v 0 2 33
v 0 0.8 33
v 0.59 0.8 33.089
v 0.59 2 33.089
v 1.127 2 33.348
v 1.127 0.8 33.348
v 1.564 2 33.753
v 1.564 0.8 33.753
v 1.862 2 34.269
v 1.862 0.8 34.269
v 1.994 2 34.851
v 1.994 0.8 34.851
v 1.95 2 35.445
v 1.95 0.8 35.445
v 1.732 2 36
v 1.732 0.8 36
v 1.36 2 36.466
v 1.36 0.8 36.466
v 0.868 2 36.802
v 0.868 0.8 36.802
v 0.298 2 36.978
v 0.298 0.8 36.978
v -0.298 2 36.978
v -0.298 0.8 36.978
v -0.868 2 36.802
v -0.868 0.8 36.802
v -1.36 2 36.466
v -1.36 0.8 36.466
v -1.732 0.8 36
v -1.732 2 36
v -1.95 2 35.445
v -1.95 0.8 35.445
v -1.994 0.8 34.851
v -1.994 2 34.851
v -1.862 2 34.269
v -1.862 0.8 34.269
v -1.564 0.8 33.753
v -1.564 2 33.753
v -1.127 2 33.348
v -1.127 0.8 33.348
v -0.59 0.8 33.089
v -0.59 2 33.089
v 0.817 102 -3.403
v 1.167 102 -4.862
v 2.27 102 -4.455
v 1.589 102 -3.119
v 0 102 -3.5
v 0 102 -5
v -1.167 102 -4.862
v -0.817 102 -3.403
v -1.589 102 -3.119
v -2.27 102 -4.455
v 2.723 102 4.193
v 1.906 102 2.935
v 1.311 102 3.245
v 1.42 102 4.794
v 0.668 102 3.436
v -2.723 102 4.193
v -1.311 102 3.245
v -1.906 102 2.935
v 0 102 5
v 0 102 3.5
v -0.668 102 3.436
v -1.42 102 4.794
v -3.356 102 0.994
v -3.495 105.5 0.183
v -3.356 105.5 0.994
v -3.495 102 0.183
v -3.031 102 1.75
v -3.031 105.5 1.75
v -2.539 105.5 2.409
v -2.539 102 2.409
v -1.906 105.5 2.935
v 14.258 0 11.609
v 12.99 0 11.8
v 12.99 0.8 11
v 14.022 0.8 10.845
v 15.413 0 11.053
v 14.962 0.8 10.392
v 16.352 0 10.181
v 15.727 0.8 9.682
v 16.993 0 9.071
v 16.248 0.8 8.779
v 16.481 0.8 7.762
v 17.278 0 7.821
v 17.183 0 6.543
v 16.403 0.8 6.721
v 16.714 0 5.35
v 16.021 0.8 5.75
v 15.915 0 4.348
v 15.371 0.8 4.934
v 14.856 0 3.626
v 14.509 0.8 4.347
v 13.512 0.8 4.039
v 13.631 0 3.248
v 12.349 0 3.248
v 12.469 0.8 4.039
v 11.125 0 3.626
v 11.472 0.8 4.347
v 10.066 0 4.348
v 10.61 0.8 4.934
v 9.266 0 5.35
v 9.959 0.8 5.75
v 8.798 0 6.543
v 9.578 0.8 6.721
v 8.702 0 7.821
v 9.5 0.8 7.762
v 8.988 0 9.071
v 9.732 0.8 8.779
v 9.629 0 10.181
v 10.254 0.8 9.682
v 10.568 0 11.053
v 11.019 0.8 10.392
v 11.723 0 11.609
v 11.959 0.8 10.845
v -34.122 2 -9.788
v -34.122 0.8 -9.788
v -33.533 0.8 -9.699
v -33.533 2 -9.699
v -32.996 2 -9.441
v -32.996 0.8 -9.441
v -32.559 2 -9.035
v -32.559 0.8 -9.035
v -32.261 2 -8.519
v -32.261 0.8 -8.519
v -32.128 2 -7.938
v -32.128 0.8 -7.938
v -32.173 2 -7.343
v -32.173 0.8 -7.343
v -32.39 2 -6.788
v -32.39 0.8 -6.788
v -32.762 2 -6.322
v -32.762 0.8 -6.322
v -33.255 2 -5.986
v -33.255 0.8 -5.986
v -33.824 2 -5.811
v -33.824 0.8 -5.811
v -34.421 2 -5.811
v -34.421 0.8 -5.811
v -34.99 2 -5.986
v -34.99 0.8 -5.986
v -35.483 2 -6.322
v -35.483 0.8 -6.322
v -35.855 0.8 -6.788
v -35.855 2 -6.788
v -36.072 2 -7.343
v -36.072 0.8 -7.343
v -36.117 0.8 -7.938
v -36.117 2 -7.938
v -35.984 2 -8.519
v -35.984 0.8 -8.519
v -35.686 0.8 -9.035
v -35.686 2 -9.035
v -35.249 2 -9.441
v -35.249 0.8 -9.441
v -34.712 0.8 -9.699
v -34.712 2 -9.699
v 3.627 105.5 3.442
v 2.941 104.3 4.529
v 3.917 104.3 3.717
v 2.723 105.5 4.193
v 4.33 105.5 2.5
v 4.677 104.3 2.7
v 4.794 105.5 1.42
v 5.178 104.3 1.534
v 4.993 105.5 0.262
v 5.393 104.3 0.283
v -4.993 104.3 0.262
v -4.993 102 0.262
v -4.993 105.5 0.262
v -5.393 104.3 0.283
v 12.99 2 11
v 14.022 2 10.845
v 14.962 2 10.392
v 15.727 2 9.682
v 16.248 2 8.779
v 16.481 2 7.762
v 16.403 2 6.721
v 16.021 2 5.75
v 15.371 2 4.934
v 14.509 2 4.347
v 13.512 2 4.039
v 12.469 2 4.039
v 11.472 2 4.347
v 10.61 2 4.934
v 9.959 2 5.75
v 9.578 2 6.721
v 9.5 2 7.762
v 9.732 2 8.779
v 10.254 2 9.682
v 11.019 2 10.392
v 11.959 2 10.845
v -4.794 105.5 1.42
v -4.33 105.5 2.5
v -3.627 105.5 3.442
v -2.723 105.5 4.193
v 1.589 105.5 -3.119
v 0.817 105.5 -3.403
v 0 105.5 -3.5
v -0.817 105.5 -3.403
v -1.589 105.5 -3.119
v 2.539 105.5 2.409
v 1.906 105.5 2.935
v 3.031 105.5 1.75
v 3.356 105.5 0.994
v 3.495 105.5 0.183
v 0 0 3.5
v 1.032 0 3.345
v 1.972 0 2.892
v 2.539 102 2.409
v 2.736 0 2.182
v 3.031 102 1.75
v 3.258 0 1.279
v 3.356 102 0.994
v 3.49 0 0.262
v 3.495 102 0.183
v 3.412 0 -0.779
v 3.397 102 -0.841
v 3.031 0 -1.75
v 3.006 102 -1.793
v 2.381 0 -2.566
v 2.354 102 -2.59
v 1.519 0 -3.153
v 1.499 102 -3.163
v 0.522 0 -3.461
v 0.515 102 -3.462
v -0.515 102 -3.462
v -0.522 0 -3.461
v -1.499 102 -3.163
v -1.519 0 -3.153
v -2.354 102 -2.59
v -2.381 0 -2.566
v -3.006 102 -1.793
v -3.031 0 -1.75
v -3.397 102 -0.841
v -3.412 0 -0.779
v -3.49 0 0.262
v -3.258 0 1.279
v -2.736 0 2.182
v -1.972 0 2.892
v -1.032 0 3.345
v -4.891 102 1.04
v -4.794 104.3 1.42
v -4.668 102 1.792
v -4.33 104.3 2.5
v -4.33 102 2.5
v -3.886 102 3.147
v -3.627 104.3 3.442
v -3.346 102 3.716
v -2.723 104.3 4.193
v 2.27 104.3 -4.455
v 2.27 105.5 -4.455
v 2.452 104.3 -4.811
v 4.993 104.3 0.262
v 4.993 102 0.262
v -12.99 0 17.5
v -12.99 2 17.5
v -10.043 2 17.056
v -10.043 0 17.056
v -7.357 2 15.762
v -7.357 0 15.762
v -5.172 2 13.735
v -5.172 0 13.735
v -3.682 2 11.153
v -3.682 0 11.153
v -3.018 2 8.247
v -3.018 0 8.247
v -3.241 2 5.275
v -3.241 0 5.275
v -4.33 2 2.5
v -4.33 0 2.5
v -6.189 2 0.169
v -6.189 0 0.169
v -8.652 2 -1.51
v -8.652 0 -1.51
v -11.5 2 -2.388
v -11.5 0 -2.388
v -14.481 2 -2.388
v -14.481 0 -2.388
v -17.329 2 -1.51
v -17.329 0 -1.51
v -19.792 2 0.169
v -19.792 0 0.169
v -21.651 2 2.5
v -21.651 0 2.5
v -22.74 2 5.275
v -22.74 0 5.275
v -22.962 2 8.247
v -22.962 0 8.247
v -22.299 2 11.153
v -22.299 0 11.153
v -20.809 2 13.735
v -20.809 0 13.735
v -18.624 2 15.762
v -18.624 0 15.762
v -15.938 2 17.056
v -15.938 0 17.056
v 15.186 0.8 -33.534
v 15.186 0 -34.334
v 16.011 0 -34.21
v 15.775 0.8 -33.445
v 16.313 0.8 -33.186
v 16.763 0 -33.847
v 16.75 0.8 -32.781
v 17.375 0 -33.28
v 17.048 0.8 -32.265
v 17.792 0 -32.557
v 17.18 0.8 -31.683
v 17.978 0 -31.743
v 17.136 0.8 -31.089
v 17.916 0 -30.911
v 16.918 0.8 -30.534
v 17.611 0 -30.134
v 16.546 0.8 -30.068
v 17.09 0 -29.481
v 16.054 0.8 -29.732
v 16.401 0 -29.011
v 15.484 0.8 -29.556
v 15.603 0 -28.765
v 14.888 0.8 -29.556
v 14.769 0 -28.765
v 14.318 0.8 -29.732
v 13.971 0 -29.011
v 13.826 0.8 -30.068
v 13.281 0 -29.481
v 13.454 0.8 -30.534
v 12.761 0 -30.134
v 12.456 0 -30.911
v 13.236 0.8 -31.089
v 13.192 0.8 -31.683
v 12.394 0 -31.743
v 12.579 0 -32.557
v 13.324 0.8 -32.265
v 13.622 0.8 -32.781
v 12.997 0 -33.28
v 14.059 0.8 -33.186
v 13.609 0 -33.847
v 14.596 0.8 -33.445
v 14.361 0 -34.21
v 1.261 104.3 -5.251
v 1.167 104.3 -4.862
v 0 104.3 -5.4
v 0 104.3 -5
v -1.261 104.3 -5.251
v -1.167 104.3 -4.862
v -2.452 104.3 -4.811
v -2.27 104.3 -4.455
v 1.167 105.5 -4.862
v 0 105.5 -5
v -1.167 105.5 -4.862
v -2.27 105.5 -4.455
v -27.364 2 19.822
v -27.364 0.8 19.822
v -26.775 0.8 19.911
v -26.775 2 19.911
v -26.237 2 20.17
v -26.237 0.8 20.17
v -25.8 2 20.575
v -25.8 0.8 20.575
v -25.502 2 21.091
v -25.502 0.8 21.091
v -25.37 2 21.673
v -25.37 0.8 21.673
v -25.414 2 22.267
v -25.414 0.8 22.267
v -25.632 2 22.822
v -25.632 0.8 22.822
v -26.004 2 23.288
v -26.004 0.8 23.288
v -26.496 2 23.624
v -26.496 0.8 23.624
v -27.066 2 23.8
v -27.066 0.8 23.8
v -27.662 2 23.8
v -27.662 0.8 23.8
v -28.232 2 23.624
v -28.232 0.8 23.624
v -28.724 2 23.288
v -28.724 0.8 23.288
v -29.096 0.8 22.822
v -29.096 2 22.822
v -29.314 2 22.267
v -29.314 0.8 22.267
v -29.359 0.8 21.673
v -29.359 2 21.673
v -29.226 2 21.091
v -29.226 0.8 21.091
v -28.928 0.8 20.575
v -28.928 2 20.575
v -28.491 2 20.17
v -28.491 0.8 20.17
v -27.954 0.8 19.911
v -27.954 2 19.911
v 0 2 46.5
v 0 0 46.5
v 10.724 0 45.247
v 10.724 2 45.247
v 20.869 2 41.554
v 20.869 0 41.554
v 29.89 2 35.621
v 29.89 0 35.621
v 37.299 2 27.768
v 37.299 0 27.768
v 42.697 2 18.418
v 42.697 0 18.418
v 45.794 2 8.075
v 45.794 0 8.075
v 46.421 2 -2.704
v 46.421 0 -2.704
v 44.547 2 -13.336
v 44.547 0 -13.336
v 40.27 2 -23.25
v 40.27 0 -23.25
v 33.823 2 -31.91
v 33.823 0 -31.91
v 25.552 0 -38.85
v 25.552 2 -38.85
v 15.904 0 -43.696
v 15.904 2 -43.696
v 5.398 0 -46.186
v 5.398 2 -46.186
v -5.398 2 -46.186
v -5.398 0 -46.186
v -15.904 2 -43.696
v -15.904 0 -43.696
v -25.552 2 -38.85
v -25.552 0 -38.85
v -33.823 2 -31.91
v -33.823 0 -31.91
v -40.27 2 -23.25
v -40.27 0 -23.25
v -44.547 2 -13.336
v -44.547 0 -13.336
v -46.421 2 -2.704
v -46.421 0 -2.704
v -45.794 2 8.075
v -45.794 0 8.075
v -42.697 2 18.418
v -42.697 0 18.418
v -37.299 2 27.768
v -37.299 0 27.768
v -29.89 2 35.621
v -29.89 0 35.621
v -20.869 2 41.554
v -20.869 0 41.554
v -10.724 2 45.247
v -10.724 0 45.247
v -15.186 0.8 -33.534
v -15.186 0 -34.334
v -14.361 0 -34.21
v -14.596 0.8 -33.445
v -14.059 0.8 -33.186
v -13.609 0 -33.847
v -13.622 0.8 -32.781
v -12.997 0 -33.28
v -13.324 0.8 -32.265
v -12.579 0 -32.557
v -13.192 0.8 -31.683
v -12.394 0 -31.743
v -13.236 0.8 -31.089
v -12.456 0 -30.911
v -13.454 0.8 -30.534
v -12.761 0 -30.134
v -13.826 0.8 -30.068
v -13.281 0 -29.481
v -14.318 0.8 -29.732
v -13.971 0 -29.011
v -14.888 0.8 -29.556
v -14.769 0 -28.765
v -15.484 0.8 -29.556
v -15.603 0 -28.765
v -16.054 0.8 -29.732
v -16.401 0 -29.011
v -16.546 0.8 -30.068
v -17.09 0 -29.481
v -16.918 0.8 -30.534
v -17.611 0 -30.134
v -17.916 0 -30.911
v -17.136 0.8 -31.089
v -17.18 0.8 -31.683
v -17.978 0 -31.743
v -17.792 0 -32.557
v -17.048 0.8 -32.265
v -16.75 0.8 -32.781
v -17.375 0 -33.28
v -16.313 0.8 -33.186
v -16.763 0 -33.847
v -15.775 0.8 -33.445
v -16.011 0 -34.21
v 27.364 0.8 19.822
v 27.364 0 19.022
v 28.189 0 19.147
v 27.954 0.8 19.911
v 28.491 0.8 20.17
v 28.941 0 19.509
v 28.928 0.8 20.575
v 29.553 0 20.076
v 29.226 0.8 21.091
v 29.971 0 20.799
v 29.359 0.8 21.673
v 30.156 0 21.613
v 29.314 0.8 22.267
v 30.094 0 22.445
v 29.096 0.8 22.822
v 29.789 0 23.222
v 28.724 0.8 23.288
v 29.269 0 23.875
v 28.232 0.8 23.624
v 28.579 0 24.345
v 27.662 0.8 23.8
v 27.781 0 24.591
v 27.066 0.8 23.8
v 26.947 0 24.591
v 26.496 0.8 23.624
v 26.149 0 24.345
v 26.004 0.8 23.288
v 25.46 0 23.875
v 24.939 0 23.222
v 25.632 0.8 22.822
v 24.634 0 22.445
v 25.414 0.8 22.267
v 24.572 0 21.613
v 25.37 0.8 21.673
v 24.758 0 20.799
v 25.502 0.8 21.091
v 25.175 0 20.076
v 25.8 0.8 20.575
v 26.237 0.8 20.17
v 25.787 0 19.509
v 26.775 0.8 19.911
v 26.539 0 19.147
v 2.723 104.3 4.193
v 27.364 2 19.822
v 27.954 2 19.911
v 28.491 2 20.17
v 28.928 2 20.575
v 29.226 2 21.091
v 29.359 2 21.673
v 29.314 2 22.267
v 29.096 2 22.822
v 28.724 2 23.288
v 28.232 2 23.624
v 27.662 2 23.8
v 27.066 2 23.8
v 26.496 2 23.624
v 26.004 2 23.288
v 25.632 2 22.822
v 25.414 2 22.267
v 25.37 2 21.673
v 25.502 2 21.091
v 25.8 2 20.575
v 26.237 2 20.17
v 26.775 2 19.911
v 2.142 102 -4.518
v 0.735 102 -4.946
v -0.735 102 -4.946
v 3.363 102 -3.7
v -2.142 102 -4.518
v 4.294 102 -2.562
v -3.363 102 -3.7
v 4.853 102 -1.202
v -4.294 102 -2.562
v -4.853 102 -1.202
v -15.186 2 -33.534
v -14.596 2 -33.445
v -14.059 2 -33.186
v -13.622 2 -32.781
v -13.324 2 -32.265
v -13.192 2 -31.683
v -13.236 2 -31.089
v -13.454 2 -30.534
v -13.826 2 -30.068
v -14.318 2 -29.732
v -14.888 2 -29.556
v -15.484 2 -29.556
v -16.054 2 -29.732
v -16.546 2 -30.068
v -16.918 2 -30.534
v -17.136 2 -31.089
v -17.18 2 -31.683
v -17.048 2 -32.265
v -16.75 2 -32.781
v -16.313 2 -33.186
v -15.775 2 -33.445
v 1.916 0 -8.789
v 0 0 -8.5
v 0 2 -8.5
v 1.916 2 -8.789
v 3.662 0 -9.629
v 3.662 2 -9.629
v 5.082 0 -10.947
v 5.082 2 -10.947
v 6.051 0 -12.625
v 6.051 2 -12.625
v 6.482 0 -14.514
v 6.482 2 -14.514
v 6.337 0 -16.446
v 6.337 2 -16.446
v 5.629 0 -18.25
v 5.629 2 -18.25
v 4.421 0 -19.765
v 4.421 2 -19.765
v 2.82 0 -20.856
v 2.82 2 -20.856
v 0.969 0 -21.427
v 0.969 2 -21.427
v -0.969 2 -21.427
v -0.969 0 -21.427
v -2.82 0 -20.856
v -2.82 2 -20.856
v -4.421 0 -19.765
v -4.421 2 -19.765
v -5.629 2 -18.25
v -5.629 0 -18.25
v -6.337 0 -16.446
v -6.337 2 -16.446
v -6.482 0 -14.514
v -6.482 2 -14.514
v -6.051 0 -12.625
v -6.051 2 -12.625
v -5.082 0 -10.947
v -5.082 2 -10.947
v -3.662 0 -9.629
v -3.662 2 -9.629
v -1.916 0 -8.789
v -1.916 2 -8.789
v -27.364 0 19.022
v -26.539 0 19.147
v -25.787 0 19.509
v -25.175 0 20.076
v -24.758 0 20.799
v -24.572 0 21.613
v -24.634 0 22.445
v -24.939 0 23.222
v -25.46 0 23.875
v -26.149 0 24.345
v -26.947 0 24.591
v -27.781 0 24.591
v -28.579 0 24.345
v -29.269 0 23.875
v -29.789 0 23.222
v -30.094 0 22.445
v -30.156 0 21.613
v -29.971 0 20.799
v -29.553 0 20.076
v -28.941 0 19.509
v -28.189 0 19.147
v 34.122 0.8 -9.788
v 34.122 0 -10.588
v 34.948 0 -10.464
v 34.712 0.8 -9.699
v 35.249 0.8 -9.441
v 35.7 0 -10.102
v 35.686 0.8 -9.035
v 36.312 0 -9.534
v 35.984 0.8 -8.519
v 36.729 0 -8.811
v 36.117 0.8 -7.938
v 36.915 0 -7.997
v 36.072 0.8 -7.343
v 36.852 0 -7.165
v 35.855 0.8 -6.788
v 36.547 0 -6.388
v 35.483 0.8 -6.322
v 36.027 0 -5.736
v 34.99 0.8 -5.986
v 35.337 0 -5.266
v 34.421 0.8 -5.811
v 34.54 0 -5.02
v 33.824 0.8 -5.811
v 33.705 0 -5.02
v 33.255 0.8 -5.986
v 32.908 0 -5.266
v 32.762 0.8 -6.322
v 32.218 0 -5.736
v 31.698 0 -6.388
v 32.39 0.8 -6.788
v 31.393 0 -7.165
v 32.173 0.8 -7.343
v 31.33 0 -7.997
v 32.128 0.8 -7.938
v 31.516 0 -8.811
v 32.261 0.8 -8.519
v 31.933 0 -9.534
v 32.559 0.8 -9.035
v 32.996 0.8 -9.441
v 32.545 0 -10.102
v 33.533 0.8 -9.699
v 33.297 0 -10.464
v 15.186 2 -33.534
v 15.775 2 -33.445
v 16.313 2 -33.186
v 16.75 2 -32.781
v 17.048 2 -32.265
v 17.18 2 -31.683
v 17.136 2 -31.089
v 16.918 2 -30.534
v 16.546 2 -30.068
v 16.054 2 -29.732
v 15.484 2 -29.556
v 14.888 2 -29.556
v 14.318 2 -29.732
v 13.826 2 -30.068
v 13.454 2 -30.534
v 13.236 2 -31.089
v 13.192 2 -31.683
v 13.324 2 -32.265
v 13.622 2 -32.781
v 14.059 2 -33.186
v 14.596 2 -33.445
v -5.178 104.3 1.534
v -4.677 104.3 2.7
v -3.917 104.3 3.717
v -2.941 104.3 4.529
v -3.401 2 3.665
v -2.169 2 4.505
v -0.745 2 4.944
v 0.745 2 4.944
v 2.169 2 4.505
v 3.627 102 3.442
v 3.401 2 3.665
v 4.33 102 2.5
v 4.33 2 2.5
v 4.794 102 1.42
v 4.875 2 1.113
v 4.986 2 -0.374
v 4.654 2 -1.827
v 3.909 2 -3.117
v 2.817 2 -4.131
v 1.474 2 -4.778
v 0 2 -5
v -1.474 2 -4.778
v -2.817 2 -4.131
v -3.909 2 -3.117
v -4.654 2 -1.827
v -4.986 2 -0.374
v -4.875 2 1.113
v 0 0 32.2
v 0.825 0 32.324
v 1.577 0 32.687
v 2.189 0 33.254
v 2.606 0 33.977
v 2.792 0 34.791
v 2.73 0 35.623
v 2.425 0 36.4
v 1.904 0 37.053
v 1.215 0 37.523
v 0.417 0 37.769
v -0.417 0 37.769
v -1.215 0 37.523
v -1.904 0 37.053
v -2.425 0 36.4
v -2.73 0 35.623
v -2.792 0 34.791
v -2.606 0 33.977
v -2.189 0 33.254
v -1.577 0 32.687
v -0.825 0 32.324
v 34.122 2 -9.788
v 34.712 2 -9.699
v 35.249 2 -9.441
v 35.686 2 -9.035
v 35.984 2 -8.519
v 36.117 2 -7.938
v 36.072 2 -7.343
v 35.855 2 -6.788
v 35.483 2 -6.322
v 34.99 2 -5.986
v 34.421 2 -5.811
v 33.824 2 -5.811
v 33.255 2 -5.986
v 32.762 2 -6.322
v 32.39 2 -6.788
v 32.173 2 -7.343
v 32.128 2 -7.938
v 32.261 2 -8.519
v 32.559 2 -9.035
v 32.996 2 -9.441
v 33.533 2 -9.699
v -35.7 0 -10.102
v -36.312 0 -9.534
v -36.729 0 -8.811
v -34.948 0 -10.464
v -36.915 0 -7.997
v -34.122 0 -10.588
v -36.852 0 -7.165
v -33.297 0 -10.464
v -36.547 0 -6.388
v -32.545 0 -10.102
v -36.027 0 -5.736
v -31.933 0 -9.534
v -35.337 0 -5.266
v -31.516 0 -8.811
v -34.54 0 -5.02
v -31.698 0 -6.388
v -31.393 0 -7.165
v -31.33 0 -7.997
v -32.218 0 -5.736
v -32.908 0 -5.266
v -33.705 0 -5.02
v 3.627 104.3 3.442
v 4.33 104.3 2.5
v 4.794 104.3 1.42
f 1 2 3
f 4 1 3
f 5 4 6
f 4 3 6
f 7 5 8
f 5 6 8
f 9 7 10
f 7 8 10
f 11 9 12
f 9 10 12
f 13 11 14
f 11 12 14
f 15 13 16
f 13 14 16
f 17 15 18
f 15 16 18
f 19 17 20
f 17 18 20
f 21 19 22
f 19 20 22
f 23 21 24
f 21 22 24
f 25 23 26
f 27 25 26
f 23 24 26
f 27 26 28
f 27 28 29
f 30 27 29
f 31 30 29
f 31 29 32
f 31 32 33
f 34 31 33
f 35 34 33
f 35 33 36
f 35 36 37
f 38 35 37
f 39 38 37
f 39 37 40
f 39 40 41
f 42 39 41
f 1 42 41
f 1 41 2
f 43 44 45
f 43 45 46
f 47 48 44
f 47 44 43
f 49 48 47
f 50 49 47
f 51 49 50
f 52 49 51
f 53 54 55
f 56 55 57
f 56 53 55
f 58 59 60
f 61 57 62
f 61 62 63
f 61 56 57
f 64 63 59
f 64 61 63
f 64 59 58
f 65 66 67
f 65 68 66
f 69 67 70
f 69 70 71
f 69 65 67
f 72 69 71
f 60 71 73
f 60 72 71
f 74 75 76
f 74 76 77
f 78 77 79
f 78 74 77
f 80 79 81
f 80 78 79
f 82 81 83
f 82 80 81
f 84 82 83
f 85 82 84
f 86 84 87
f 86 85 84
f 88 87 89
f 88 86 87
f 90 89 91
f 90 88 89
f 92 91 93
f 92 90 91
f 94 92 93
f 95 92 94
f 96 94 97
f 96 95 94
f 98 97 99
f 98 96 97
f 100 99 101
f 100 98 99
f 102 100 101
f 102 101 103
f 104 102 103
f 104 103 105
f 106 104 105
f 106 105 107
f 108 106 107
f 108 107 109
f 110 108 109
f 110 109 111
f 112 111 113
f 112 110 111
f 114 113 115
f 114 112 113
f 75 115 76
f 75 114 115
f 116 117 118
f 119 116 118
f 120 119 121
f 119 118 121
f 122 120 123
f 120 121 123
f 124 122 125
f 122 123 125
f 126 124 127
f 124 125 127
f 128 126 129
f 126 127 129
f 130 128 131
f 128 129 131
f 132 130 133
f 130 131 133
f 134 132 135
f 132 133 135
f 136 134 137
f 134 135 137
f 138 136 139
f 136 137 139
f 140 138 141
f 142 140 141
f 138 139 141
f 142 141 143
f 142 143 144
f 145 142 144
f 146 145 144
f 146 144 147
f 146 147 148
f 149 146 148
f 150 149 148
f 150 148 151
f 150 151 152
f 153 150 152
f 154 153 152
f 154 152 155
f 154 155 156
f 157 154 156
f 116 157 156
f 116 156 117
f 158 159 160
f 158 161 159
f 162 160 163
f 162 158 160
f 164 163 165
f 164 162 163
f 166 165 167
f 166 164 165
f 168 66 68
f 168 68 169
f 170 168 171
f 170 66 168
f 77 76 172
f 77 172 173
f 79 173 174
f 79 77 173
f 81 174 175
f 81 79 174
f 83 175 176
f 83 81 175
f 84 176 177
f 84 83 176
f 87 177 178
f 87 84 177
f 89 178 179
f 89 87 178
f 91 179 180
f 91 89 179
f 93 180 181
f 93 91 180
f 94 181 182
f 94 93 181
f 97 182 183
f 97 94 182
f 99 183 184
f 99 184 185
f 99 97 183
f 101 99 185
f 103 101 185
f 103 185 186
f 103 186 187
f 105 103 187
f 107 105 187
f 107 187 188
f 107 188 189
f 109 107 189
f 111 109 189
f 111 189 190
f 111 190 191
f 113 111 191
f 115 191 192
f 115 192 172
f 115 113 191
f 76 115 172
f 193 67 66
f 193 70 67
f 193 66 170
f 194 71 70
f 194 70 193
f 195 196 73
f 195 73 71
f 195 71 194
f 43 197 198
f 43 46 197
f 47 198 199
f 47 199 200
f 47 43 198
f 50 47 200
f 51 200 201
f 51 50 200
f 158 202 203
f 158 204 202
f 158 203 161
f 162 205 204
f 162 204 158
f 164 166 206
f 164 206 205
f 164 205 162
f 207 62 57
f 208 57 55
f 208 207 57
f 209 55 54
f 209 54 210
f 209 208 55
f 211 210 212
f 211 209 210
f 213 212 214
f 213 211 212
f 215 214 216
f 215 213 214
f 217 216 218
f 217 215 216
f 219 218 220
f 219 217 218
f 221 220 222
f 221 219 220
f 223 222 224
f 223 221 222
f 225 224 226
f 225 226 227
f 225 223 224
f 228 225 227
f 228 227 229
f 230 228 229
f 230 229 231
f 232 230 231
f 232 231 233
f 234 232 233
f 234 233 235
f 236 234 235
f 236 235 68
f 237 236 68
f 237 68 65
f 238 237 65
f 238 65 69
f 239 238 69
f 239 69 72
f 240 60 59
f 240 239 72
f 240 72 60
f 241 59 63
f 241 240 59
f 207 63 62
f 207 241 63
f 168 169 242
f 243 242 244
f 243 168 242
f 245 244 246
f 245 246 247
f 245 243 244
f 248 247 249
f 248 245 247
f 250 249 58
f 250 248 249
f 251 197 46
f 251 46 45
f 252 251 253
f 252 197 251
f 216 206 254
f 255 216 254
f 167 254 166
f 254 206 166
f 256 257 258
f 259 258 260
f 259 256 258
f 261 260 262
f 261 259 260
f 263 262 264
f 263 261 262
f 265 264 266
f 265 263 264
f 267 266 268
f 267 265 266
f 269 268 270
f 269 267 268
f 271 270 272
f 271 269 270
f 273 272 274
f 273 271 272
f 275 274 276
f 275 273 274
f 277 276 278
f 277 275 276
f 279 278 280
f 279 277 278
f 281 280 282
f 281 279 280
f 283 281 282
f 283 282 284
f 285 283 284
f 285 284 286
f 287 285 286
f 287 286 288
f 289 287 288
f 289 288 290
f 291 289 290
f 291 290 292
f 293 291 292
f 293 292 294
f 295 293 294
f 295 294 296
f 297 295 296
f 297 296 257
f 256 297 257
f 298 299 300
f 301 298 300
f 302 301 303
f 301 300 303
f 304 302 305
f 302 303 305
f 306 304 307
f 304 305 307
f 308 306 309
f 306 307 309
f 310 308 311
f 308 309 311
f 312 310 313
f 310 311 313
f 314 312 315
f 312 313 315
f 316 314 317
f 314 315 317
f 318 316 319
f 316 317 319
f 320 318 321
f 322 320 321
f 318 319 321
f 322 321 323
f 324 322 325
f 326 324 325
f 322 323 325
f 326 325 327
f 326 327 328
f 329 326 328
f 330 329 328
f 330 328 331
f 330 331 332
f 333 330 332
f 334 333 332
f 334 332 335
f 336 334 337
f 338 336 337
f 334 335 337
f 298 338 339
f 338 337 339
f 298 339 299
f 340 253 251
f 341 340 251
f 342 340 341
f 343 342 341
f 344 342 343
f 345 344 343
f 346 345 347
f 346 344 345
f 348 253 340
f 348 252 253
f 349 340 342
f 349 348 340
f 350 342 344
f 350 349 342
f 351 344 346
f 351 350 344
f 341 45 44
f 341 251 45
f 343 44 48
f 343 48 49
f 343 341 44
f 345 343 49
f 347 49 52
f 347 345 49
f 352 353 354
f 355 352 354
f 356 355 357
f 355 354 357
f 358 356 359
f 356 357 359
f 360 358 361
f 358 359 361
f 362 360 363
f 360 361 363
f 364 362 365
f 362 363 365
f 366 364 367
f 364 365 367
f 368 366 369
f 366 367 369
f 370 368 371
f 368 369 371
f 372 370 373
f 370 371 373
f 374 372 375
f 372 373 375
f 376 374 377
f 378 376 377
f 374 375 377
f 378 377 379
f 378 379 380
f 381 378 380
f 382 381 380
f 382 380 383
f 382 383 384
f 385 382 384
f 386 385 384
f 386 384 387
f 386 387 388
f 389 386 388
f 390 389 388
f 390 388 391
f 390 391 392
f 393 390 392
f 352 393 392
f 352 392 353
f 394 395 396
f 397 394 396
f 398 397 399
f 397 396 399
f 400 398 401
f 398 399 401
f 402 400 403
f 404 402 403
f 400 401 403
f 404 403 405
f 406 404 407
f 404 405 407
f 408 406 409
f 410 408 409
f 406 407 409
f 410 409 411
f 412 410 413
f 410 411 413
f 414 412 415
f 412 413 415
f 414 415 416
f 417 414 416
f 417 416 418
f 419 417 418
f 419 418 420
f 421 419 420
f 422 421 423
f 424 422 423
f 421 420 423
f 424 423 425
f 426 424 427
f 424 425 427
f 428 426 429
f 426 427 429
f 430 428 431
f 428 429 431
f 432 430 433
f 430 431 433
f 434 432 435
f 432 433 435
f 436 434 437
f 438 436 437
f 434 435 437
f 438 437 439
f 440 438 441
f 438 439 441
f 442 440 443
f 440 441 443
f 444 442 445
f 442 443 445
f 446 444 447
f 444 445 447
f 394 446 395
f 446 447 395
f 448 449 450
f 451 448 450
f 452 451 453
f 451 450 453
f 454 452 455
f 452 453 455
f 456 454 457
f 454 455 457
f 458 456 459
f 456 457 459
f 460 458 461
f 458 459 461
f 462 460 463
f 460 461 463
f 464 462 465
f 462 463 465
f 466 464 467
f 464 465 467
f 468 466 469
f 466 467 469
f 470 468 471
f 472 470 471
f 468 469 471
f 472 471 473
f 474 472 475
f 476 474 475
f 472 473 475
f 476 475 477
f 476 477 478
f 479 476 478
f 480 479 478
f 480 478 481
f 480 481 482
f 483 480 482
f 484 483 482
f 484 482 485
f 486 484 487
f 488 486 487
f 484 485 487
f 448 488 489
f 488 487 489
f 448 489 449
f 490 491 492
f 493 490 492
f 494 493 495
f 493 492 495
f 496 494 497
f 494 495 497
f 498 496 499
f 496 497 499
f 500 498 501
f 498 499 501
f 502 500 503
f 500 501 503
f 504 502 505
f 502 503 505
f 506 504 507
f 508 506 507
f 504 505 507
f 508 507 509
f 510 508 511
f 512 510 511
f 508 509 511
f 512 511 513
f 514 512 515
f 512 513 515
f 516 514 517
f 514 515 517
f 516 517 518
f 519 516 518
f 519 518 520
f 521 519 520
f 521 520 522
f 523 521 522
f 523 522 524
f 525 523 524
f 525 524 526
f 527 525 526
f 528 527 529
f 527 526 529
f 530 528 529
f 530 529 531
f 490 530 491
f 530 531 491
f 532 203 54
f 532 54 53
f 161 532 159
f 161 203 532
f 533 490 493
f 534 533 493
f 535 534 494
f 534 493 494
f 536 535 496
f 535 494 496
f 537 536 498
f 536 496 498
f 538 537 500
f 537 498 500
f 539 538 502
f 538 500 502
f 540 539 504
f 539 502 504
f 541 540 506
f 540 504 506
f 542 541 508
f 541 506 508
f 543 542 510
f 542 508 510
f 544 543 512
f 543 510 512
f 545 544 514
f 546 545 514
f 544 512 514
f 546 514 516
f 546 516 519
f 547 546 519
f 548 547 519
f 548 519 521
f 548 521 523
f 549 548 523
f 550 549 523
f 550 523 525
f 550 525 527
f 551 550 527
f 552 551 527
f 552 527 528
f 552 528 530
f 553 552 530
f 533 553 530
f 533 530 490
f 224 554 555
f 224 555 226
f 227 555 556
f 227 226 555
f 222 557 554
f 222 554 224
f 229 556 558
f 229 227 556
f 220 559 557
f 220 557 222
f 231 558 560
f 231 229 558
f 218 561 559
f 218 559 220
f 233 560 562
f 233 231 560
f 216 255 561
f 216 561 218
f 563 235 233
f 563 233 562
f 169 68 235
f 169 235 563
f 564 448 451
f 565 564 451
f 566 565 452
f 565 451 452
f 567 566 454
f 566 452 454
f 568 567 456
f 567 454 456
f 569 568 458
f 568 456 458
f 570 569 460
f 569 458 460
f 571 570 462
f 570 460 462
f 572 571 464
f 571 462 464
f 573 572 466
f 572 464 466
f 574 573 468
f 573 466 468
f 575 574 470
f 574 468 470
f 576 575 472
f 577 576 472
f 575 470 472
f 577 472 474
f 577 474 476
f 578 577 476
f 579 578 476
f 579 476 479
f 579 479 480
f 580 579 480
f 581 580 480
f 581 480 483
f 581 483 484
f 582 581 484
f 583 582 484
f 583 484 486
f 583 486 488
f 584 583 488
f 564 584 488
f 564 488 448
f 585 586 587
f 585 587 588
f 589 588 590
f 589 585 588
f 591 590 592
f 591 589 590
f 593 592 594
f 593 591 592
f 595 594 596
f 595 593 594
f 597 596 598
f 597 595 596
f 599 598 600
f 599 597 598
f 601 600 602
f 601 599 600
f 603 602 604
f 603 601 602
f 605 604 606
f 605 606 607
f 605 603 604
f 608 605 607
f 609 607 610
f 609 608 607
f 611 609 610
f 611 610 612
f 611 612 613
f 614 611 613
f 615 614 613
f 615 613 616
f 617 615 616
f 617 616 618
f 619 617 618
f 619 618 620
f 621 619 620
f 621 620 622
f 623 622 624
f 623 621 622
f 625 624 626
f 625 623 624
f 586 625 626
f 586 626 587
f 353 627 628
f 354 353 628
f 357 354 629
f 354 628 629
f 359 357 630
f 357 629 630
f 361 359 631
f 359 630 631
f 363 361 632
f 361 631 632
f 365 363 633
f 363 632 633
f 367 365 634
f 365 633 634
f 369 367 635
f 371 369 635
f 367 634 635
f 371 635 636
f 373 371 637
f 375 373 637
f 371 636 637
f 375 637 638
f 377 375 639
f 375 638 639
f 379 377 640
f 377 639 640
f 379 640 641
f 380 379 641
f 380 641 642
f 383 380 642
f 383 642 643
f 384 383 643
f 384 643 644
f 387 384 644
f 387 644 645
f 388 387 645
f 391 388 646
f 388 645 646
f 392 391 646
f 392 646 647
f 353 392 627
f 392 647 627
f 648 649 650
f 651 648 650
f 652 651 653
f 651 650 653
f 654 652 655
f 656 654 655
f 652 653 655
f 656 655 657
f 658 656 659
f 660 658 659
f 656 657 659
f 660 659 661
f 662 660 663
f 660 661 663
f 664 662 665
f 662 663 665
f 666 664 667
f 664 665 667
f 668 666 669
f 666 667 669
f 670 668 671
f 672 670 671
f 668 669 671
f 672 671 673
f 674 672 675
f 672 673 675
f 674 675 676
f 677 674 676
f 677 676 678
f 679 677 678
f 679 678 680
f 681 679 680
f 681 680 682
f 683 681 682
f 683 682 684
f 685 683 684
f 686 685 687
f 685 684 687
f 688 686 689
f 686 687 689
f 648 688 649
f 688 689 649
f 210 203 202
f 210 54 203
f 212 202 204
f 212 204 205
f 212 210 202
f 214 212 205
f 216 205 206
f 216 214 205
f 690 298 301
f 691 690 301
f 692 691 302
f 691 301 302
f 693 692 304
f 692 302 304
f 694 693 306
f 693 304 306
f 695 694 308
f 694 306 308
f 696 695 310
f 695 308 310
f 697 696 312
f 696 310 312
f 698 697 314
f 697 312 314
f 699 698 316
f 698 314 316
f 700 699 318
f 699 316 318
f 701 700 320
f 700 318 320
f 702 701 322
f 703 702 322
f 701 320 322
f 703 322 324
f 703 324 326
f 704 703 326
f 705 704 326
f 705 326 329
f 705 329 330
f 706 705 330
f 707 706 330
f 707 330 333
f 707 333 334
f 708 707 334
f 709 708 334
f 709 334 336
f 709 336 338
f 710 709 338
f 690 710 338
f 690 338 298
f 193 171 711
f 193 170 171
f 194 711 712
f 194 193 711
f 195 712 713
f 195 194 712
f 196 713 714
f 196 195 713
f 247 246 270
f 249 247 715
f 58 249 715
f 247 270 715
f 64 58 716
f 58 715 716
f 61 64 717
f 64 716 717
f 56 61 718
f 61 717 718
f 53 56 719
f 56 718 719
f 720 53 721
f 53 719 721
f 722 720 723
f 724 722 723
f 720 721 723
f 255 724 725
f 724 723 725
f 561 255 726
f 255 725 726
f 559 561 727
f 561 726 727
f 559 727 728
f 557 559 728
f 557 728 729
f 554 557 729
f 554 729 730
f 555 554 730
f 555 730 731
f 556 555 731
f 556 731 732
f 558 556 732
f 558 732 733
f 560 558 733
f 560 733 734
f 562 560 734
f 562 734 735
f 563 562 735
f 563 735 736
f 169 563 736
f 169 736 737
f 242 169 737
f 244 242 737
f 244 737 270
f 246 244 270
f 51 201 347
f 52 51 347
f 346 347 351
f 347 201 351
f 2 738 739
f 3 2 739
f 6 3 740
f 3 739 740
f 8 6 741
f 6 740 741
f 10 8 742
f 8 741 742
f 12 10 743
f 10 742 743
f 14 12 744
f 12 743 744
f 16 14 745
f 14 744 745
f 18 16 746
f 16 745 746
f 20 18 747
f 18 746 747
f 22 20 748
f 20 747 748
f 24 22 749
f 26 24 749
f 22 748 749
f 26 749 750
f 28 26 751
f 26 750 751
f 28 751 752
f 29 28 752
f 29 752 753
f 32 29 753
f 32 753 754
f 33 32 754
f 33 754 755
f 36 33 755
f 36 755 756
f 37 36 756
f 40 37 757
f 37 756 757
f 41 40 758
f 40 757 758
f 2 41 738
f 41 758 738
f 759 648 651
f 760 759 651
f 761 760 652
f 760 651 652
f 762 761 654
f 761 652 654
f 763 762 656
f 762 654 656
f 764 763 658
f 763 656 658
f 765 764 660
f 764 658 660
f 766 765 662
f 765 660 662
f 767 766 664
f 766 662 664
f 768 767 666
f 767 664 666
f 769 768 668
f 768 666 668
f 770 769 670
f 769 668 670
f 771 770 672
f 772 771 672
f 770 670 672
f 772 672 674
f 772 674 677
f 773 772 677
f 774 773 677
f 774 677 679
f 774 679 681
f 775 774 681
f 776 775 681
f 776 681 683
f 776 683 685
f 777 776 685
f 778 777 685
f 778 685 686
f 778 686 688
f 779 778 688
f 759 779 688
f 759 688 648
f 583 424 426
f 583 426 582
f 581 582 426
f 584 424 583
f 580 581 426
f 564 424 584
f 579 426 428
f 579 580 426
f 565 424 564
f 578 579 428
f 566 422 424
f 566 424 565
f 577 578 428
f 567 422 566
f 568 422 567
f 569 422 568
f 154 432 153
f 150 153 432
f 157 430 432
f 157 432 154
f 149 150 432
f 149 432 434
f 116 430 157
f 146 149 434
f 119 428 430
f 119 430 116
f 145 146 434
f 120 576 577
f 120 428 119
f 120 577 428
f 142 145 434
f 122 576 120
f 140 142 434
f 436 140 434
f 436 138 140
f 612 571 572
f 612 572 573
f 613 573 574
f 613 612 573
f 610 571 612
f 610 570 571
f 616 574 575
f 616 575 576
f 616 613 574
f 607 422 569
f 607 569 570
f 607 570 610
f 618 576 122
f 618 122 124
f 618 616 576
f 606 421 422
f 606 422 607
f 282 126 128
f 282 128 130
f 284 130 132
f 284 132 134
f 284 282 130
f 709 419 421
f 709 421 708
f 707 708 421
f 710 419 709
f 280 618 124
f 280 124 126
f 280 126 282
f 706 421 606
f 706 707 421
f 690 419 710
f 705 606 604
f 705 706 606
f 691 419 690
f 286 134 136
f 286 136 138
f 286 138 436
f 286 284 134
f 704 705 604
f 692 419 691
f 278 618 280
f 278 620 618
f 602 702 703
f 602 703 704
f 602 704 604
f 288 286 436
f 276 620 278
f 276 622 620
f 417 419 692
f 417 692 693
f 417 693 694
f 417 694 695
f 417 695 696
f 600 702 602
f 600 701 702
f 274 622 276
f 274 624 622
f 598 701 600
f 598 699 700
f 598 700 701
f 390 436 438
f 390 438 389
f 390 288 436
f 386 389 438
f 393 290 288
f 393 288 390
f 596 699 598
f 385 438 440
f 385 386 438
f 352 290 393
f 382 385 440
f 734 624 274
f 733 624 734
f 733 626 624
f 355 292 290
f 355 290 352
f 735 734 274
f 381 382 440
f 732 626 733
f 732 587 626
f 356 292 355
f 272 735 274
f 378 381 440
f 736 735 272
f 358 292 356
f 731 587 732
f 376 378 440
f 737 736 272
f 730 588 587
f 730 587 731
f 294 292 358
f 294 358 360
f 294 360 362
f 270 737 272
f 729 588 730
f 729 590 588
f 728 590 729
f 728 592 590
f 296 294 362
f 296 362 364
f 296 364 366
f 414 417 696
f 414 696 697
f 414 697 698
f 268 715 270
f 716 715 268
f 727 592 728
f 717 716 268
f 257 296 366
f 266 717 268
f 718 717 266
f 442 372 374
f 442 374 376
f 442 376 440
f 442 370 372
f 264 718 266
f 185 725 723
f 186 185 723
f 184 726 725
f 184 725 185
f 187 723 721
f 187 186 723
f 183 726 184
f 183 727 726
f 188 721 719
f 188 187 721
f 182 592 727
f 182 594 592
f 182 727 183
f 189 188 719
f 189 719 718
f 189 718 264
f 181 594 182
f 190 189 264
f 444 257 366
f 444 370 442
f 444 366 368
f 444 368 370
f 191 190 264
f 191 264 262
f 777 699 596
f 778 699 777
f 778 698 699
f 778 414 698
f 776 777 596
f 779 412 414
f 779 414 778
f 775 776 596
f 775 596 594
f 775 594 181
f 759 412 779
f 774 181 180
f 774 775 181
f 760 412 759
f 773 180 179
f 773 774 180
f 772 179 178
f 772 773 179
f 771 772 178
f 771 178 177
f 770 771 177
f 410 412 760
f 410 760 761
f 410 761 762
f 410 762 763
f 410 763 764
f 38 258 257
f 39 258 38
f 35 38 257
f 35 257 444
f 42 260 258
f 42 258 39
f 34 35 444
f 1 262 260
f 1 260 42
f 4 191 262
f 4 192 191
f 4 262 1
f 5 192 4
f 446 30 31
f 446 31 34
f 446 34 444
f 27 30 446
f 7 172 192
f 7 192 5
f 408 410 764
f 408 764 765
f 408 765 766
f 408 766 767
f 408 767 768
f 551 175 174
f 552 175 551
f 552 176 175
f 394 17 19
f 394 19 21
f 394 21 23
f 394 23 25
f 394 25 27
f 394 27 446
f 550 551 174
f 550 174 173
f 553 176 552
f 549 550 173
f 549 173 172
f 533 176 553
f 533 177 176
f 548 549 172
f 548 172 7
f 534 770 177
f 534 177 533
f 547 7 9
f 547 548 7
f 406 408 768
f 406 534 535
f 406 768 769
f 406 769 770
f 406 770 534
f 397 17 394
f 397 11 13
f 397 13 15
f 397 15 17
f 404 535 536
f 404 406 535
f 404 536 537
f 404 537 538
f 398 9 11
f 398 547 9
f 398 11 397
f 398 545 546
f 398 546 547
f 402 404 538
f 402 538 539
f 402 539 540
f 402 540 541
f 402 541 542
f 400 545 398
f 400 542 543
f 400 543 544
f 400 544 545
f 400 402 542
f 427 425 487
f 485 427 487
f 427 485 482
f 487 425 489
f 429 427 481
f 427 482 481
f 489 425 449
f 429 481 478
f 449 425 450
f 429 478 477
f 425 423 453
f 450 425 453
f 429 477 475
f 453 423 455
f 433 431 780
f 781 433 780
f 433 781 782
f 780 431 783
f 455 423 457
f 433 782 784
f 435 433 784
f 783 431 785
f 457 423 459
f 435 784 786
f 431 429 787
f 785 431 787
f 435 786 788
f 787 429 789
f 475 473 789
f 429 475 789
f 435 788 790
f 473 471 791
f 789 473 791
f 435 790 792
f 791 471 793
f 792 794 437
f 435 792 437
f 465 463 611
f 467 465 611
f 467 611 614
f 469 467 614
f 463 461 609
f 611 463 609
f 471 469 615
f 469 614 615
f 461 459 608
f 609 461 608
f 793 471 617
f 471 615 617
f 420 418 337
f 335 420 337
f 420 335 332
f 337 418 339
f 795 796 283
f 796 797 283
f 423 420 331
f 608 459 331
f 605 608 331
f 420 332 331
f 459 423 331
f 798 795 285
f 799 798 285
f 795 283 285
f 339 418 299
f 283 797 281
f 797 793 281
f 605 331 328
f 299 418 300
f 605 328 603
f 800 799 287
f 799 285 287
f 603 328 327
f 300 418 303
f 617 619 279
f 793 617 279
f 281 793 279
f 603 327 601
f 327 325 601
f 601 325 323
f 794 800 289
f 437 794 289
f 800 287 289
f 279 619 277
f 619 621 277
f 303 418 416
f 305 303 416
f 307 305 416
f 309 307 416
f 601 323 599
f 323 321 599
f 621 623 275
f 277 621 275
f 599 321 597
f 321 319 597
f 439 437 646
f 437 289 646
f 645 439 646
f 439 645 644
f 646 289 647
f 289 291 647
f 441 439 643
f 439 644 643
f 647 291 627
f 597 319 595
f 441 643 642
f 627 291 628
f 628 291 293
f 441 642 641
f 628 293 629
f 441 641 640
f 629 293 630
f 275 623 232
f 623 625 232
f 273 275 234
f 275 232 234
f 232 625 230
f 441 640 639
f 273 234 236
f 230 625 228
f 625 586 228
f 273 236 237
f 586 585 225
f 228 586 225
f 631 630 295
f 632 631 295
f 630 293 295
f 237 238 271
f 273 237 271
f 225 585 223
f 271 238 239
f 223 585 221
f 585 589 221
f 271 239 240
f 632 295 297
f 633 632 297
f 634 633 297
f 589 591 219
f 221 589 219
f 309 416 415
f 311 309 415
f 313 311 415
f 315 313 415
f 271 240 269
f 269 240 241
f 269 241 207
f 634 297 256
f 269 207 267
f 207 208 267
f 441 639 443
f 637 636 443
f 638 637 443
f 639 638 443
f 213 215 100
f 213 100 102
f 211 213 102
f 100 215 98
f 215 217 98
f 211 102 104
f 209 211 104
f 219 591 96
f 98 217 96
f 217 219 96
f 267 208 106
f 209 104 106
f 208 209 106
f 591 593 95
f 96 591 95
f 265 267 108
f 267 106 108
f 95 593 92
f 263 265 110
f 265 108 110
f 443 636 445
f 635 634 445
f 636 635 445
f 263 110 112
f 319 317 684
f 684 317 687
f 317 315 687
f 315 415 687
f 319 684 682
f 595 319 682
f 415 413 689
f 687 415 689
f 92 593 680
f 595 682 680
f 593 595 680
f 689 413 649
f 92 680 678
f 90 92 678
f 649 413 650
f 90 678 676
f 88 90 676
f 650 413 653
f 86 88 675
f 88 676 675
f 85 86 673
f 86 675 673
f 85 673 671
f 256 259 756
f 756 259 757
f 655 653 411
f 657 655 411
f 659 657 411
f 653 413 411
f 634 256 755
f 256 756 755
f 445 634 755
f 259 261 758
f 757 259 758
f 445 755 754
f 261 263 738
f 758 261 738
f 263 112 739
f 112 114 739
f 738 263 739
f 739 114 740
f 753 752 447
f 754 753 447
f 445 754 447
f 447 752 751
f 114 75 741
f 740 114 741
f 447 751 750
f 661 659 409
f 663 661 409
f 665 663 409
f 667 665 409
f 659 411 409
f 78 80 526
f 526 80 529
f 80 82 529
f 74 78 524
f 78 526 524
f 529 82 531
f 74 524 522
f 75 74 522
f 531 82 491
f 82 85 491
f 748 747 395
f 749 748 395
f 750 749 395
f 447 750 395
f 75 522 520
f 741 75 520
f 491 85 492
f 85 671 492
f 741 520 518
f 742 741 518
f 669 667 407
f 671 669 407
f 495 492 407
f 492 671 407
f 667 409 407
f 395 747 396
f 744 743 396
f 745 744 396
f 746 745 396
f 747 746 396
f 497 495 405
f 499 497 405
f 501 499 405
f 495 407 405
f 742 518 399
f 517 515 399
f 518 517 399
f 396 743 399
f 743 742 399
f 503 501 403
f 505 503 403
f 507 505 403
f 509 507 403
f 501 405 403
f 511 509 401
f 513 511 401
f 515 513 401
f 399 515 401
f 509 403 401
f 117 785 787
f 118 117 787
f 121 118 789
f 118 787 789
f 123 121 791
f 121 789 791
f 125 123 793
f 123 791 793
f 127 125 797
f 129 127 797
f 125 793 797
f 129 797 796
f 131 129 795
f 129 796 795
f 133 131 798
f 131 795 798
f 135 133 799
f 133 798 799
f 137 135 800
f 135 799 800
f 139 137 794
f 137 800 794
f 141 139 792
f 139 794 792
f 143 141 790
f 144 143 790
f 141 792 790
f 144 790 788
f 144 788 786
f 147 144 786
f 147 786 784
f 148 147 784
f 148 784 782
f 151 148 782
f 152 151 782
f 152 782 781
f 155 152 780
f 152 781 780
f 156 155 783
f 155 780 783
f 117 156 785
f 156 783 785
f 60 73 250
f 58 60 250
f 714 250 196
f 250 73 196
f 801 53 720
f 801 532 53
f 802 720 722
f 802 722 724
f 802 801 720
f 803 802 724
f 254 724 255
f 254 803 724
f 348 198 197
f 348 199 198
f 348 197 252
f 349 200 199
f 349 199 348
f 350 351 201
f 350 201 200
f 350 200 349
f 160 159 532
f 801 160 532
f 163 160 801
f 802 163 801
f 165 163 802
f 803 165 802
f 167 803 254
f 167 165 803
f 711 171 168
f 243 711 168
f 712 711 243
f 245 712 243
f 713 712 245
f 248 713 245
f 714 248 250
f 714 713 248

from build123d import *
from build123d.topology import SkipClean

# Parameters (mm, degrees)
SKETCH1_R           = 46.5
SKETCH1_R_2         = 6.5
SKETCH1_R_3         = 10
SKETCH1_R_4         = 3.5
BOSS_EXTRUDE1_DEPTH = 2
SKETCH3_R           = 5
SKETCH3_R_2         = 3.5
BOSS_EXTRUDE2_DEPTH = 100
CUT_EXTRUDE2_REACH  = 123.361
SKETCH6_R           = 2
CHAMFER2_SIZE       = 0.8
REVOLVE1_ANGLE      = 54
CIRPATTERN1_COUNT   = 3


# Read off the part's stored shape, not the designer's step: Revolve1
with BuildPart() as part:
    # Sketch1 → Boss-Extrude1 (new body)
    with BuildSketch(Plane(origin=(0, 0, 0), x_dir=(1, 0, 0), z_dir=(0, 1, 0))):
        with Locations(Location((0, 0, 0), (0, 0, 270))):
            Circle(SKETCH1_R)
        with Locations(Location((0, 15, 0), (0, 0, 270))):
            Circle(SKETCH1_R_2, mode=Mode.SUBTRACT)
        with Locations(Location((-12.990381057, -7.5, 0), (0, 0, 270))):
            Circle(SKETCH1_R_3, mode=Mode.SUBTRACT)
        with Locations(Location((12.990381057, -7.5, 0), (0, 0, 270))):
            Circle(SKETCH1_R_4, mode=Mode.SUBTRACT)
        with Locations(Location((0, 0, 0), (0, 0, 270))):
            Circle(SKETCH1_R_4, mode=Mode.SUBTRACT)
    extrude(amount=BOSS_EXTRUDE1_DEPTH)

    # Sketch3 → Boss-Extrude2 (add)
    with BuildSketch(Plane(origin=(0, 2, 0), x_dir=(1, 0, 0), z_dir=(0, 1, 0))):
        with Locations(Location((0, 0, 0), (0, 0, 210))):
            Circle(SKETCH3_R)
        with Locations(Location((0, 0, 0), (0, 0, 270))):
            Circle(SKETCH3_R_2, mode=Mode.SUBTRACT)
    extrude(amount=BOSS_EXTRUDE2_DEPTH)

    # Sketch6 → Cut-Extrude2 (cut, up to next)
    with BuildSketch(Plane.XZ, mode=Mode.PRIVATE) as cut_extrude2_sk1:
        with Locations(Location((0, 35, 0), (0, 0, 270))):
            Circle(SKETCH6_R)
    cut_extrude2_tool1 = extrude(cut_extrude2_sk1.sketch, amount=-CUT_EXTRUDE2_REACH, mode=Mode.PRIVATE) & part.part
    # Sketch6 → Cut-Extrude2 (cut, up to next)
    with BuildSketch(Plane.XZ, mode=Mode.PRIVATE) as cut_extrude2_sk2:
        with Locations(Location((27.364101886, 21.822143065, 0), (0, 0, 270))):
            Circle(SKETCH6_R)
    cut_extrude2_tool2 = extrude(cut_extrude2_sk2.sketch, amount=-CUT_EXTRUDE2_REACH, mode=Mode.PRIVATE) & part.part
    # Sketch6 → Cut-Extrude2 (cut, up to next)
    with BuildSketch(Plane.XZ, mode=Mode.PRIVATE) as cut_extrude2_sk3:
        with Locations(Location((34.122476926, -7.788232688, 0), (0, 0, 270))):
            Circle(SKETCH6_R)
    cut_extrude2_tool3 = extrude(cut_extrude2_sk3.sketch, amount=-CUT_EXTRUDE2_REACH, mode=Mode.PRIVATE) & part.part
    # Sketch6 → Cut-Extrude2 (cut, up to next)
    with BuildSketch(Plane.XZ, mode=Mode.PRIVATE) as cut_extrude2_sk4:
        with Locations(Location((15.185930869, -31.533910377, 0), (0, 0, 270))):
            Circle(SKETCH6_R)
    cut_extrude2_tool4 = extrude(cut_extrude2_sk4.sketch, amount=-CUT_EXTRUDE2_REACH, mode=Mode.PRIVATE) & part.part
    # Sketch6 → Cut-Extrude2 (cut, up to next)
    with BuildSketch(Plane.XZ, mode=Mode.PRIVATE) as cut_extrude2_sk5:
        with Locations(Location((-15.185930869, -31.533910377, 0), (0, 0, 270))):
            Circle(SKETCH6_R)
    cut_extrude2_tool5 = extrude(cut_extrude2_sk5.sketch, amount=-CUT_EXTRUDE2_REACH, mode=Mode.PRIVATE) & part.part
    # Sketch6 → Cut-Extrude2 (cut, up to next)
    with BuildSketch(Plane.XZ, mode=Mode.PRIVATE) as cut_extrude2_sk6:
        with Locations(Location((-34.122476926, -7.788232688, 0), (0, 0, 270))):
            Circle(SKETCH6_R)
    cut_extrude2_tool6 = extrude(cut_extrude2_sk6.sketch, amount=-CUT_EXTRUDE2_REACH, mode=Mode.PRIVATE) & part.part
    # Sketch6 → Cut-Extrude2 (cut, up to next)
    with BuildSketch(Plane.XZ, mode=Mode.PRIVATE) as cut_extrude2_sk7:
        with Locations(Location((-27.364101886, 21.822143065, 0), (0, 0, 270))):
            Circle(SKETCH6_R)
    cut_extrude2_tool7 = extrude(cut_extrude2_sk7.sketch, amount=-CUT_EXTRUDE2_REACH, mode=Mode.PRIVATE) & part.part
    add(cut_extrude2_tool1.solids().sort_by_distance((0, 0, 35))[0], mode=Mode.SUBTRACT)
    add(cut_extrude2_tool2.solids().sort_by_distance((27.364102, 0, 21.822143))[0], mode=Mode.SUBTRACT)
    add(cut_extrude2_tool3.solids().sort_by_distance((34.122477, 0, -7.788233))[0], mode=Mode.SUBTRACT)
    add(cut_extrude2_tool4.solids().sort_by_distance((15.185931, 0, -31.53391))[0], mode=Mode.SUBTRACT)
    add(cut_extrude2_tool5.solids().sort_by_distance((-15.185931, 0, -31.53391))[0], mode=Mode.SUBTRACT)
    add(cut_extrude2_tool6.solids().sort_by_distance((-34.122477, 0, -7.788233))[0], mode=Mode.SUBTRACT)
    add(cut_extrude2_tool7.solids().sort_by_distance((-27.364102, 0, 21.822143))[0], mode=Mode.SUBTRACT)

    # Chamfer2
    chamfer2_edges = [part.edges().sort_by_distance(p)[0] for p in [
        (12.990381057, 0, 4),
        (34.122476926, 0, -5.788232688),
        (27.364101886, 0, 23.822143065),
        (0, 0, 37),
        (-27.364101886, 0, 23.822143065),
        (-34.122476926, 0, -5.788232688),
        (-15.185930869, 0, -29.533910377),
        (15.185930869, 0, -29.533910377),
    ]]
    chamfer(chamfer2_edges, length=CHAMFER2_SIZE)


with BuildPart() as body_2:
    # Revolve1 outline → Revolve1 (revolve)
    with BuildSketch(Plane(origin=(0, 0, 0), x_dir=(0.4539904997395532, 0, -0.8910065241883646), z_dir=(0.8910065241883646, 0, 0.4539904997395532))):
        Polygon((5, 102), (5, 104.3), (5.4, 104.3), (5, 105.5), (3.5, 105.5), (3.5, 102), align=None)
    revolve1 = revolve(axis=Axis((0, 0, 0), (0, 1, 0)), revolution_arc=REVOLVE1_ANGLE)


with BuildPart() as part_1:
    with SkipClean():  # the faces are left unmerged after this step: merging them gives an invalid solid
        add(part.part)

        # CirPattern1: Revolve1 ×3 about axis
        cirpattern1_axis = Axis((0, 102, 0), (0, -1, 0))
        for i in range(1, CIRPATTERN1_COUNT):
            add(revolve1.rotate(cirpattern1_axis, i * 360 / CIRPATTERN1_COUNT))


solid = Compound([body_2.part, part_1.part])
